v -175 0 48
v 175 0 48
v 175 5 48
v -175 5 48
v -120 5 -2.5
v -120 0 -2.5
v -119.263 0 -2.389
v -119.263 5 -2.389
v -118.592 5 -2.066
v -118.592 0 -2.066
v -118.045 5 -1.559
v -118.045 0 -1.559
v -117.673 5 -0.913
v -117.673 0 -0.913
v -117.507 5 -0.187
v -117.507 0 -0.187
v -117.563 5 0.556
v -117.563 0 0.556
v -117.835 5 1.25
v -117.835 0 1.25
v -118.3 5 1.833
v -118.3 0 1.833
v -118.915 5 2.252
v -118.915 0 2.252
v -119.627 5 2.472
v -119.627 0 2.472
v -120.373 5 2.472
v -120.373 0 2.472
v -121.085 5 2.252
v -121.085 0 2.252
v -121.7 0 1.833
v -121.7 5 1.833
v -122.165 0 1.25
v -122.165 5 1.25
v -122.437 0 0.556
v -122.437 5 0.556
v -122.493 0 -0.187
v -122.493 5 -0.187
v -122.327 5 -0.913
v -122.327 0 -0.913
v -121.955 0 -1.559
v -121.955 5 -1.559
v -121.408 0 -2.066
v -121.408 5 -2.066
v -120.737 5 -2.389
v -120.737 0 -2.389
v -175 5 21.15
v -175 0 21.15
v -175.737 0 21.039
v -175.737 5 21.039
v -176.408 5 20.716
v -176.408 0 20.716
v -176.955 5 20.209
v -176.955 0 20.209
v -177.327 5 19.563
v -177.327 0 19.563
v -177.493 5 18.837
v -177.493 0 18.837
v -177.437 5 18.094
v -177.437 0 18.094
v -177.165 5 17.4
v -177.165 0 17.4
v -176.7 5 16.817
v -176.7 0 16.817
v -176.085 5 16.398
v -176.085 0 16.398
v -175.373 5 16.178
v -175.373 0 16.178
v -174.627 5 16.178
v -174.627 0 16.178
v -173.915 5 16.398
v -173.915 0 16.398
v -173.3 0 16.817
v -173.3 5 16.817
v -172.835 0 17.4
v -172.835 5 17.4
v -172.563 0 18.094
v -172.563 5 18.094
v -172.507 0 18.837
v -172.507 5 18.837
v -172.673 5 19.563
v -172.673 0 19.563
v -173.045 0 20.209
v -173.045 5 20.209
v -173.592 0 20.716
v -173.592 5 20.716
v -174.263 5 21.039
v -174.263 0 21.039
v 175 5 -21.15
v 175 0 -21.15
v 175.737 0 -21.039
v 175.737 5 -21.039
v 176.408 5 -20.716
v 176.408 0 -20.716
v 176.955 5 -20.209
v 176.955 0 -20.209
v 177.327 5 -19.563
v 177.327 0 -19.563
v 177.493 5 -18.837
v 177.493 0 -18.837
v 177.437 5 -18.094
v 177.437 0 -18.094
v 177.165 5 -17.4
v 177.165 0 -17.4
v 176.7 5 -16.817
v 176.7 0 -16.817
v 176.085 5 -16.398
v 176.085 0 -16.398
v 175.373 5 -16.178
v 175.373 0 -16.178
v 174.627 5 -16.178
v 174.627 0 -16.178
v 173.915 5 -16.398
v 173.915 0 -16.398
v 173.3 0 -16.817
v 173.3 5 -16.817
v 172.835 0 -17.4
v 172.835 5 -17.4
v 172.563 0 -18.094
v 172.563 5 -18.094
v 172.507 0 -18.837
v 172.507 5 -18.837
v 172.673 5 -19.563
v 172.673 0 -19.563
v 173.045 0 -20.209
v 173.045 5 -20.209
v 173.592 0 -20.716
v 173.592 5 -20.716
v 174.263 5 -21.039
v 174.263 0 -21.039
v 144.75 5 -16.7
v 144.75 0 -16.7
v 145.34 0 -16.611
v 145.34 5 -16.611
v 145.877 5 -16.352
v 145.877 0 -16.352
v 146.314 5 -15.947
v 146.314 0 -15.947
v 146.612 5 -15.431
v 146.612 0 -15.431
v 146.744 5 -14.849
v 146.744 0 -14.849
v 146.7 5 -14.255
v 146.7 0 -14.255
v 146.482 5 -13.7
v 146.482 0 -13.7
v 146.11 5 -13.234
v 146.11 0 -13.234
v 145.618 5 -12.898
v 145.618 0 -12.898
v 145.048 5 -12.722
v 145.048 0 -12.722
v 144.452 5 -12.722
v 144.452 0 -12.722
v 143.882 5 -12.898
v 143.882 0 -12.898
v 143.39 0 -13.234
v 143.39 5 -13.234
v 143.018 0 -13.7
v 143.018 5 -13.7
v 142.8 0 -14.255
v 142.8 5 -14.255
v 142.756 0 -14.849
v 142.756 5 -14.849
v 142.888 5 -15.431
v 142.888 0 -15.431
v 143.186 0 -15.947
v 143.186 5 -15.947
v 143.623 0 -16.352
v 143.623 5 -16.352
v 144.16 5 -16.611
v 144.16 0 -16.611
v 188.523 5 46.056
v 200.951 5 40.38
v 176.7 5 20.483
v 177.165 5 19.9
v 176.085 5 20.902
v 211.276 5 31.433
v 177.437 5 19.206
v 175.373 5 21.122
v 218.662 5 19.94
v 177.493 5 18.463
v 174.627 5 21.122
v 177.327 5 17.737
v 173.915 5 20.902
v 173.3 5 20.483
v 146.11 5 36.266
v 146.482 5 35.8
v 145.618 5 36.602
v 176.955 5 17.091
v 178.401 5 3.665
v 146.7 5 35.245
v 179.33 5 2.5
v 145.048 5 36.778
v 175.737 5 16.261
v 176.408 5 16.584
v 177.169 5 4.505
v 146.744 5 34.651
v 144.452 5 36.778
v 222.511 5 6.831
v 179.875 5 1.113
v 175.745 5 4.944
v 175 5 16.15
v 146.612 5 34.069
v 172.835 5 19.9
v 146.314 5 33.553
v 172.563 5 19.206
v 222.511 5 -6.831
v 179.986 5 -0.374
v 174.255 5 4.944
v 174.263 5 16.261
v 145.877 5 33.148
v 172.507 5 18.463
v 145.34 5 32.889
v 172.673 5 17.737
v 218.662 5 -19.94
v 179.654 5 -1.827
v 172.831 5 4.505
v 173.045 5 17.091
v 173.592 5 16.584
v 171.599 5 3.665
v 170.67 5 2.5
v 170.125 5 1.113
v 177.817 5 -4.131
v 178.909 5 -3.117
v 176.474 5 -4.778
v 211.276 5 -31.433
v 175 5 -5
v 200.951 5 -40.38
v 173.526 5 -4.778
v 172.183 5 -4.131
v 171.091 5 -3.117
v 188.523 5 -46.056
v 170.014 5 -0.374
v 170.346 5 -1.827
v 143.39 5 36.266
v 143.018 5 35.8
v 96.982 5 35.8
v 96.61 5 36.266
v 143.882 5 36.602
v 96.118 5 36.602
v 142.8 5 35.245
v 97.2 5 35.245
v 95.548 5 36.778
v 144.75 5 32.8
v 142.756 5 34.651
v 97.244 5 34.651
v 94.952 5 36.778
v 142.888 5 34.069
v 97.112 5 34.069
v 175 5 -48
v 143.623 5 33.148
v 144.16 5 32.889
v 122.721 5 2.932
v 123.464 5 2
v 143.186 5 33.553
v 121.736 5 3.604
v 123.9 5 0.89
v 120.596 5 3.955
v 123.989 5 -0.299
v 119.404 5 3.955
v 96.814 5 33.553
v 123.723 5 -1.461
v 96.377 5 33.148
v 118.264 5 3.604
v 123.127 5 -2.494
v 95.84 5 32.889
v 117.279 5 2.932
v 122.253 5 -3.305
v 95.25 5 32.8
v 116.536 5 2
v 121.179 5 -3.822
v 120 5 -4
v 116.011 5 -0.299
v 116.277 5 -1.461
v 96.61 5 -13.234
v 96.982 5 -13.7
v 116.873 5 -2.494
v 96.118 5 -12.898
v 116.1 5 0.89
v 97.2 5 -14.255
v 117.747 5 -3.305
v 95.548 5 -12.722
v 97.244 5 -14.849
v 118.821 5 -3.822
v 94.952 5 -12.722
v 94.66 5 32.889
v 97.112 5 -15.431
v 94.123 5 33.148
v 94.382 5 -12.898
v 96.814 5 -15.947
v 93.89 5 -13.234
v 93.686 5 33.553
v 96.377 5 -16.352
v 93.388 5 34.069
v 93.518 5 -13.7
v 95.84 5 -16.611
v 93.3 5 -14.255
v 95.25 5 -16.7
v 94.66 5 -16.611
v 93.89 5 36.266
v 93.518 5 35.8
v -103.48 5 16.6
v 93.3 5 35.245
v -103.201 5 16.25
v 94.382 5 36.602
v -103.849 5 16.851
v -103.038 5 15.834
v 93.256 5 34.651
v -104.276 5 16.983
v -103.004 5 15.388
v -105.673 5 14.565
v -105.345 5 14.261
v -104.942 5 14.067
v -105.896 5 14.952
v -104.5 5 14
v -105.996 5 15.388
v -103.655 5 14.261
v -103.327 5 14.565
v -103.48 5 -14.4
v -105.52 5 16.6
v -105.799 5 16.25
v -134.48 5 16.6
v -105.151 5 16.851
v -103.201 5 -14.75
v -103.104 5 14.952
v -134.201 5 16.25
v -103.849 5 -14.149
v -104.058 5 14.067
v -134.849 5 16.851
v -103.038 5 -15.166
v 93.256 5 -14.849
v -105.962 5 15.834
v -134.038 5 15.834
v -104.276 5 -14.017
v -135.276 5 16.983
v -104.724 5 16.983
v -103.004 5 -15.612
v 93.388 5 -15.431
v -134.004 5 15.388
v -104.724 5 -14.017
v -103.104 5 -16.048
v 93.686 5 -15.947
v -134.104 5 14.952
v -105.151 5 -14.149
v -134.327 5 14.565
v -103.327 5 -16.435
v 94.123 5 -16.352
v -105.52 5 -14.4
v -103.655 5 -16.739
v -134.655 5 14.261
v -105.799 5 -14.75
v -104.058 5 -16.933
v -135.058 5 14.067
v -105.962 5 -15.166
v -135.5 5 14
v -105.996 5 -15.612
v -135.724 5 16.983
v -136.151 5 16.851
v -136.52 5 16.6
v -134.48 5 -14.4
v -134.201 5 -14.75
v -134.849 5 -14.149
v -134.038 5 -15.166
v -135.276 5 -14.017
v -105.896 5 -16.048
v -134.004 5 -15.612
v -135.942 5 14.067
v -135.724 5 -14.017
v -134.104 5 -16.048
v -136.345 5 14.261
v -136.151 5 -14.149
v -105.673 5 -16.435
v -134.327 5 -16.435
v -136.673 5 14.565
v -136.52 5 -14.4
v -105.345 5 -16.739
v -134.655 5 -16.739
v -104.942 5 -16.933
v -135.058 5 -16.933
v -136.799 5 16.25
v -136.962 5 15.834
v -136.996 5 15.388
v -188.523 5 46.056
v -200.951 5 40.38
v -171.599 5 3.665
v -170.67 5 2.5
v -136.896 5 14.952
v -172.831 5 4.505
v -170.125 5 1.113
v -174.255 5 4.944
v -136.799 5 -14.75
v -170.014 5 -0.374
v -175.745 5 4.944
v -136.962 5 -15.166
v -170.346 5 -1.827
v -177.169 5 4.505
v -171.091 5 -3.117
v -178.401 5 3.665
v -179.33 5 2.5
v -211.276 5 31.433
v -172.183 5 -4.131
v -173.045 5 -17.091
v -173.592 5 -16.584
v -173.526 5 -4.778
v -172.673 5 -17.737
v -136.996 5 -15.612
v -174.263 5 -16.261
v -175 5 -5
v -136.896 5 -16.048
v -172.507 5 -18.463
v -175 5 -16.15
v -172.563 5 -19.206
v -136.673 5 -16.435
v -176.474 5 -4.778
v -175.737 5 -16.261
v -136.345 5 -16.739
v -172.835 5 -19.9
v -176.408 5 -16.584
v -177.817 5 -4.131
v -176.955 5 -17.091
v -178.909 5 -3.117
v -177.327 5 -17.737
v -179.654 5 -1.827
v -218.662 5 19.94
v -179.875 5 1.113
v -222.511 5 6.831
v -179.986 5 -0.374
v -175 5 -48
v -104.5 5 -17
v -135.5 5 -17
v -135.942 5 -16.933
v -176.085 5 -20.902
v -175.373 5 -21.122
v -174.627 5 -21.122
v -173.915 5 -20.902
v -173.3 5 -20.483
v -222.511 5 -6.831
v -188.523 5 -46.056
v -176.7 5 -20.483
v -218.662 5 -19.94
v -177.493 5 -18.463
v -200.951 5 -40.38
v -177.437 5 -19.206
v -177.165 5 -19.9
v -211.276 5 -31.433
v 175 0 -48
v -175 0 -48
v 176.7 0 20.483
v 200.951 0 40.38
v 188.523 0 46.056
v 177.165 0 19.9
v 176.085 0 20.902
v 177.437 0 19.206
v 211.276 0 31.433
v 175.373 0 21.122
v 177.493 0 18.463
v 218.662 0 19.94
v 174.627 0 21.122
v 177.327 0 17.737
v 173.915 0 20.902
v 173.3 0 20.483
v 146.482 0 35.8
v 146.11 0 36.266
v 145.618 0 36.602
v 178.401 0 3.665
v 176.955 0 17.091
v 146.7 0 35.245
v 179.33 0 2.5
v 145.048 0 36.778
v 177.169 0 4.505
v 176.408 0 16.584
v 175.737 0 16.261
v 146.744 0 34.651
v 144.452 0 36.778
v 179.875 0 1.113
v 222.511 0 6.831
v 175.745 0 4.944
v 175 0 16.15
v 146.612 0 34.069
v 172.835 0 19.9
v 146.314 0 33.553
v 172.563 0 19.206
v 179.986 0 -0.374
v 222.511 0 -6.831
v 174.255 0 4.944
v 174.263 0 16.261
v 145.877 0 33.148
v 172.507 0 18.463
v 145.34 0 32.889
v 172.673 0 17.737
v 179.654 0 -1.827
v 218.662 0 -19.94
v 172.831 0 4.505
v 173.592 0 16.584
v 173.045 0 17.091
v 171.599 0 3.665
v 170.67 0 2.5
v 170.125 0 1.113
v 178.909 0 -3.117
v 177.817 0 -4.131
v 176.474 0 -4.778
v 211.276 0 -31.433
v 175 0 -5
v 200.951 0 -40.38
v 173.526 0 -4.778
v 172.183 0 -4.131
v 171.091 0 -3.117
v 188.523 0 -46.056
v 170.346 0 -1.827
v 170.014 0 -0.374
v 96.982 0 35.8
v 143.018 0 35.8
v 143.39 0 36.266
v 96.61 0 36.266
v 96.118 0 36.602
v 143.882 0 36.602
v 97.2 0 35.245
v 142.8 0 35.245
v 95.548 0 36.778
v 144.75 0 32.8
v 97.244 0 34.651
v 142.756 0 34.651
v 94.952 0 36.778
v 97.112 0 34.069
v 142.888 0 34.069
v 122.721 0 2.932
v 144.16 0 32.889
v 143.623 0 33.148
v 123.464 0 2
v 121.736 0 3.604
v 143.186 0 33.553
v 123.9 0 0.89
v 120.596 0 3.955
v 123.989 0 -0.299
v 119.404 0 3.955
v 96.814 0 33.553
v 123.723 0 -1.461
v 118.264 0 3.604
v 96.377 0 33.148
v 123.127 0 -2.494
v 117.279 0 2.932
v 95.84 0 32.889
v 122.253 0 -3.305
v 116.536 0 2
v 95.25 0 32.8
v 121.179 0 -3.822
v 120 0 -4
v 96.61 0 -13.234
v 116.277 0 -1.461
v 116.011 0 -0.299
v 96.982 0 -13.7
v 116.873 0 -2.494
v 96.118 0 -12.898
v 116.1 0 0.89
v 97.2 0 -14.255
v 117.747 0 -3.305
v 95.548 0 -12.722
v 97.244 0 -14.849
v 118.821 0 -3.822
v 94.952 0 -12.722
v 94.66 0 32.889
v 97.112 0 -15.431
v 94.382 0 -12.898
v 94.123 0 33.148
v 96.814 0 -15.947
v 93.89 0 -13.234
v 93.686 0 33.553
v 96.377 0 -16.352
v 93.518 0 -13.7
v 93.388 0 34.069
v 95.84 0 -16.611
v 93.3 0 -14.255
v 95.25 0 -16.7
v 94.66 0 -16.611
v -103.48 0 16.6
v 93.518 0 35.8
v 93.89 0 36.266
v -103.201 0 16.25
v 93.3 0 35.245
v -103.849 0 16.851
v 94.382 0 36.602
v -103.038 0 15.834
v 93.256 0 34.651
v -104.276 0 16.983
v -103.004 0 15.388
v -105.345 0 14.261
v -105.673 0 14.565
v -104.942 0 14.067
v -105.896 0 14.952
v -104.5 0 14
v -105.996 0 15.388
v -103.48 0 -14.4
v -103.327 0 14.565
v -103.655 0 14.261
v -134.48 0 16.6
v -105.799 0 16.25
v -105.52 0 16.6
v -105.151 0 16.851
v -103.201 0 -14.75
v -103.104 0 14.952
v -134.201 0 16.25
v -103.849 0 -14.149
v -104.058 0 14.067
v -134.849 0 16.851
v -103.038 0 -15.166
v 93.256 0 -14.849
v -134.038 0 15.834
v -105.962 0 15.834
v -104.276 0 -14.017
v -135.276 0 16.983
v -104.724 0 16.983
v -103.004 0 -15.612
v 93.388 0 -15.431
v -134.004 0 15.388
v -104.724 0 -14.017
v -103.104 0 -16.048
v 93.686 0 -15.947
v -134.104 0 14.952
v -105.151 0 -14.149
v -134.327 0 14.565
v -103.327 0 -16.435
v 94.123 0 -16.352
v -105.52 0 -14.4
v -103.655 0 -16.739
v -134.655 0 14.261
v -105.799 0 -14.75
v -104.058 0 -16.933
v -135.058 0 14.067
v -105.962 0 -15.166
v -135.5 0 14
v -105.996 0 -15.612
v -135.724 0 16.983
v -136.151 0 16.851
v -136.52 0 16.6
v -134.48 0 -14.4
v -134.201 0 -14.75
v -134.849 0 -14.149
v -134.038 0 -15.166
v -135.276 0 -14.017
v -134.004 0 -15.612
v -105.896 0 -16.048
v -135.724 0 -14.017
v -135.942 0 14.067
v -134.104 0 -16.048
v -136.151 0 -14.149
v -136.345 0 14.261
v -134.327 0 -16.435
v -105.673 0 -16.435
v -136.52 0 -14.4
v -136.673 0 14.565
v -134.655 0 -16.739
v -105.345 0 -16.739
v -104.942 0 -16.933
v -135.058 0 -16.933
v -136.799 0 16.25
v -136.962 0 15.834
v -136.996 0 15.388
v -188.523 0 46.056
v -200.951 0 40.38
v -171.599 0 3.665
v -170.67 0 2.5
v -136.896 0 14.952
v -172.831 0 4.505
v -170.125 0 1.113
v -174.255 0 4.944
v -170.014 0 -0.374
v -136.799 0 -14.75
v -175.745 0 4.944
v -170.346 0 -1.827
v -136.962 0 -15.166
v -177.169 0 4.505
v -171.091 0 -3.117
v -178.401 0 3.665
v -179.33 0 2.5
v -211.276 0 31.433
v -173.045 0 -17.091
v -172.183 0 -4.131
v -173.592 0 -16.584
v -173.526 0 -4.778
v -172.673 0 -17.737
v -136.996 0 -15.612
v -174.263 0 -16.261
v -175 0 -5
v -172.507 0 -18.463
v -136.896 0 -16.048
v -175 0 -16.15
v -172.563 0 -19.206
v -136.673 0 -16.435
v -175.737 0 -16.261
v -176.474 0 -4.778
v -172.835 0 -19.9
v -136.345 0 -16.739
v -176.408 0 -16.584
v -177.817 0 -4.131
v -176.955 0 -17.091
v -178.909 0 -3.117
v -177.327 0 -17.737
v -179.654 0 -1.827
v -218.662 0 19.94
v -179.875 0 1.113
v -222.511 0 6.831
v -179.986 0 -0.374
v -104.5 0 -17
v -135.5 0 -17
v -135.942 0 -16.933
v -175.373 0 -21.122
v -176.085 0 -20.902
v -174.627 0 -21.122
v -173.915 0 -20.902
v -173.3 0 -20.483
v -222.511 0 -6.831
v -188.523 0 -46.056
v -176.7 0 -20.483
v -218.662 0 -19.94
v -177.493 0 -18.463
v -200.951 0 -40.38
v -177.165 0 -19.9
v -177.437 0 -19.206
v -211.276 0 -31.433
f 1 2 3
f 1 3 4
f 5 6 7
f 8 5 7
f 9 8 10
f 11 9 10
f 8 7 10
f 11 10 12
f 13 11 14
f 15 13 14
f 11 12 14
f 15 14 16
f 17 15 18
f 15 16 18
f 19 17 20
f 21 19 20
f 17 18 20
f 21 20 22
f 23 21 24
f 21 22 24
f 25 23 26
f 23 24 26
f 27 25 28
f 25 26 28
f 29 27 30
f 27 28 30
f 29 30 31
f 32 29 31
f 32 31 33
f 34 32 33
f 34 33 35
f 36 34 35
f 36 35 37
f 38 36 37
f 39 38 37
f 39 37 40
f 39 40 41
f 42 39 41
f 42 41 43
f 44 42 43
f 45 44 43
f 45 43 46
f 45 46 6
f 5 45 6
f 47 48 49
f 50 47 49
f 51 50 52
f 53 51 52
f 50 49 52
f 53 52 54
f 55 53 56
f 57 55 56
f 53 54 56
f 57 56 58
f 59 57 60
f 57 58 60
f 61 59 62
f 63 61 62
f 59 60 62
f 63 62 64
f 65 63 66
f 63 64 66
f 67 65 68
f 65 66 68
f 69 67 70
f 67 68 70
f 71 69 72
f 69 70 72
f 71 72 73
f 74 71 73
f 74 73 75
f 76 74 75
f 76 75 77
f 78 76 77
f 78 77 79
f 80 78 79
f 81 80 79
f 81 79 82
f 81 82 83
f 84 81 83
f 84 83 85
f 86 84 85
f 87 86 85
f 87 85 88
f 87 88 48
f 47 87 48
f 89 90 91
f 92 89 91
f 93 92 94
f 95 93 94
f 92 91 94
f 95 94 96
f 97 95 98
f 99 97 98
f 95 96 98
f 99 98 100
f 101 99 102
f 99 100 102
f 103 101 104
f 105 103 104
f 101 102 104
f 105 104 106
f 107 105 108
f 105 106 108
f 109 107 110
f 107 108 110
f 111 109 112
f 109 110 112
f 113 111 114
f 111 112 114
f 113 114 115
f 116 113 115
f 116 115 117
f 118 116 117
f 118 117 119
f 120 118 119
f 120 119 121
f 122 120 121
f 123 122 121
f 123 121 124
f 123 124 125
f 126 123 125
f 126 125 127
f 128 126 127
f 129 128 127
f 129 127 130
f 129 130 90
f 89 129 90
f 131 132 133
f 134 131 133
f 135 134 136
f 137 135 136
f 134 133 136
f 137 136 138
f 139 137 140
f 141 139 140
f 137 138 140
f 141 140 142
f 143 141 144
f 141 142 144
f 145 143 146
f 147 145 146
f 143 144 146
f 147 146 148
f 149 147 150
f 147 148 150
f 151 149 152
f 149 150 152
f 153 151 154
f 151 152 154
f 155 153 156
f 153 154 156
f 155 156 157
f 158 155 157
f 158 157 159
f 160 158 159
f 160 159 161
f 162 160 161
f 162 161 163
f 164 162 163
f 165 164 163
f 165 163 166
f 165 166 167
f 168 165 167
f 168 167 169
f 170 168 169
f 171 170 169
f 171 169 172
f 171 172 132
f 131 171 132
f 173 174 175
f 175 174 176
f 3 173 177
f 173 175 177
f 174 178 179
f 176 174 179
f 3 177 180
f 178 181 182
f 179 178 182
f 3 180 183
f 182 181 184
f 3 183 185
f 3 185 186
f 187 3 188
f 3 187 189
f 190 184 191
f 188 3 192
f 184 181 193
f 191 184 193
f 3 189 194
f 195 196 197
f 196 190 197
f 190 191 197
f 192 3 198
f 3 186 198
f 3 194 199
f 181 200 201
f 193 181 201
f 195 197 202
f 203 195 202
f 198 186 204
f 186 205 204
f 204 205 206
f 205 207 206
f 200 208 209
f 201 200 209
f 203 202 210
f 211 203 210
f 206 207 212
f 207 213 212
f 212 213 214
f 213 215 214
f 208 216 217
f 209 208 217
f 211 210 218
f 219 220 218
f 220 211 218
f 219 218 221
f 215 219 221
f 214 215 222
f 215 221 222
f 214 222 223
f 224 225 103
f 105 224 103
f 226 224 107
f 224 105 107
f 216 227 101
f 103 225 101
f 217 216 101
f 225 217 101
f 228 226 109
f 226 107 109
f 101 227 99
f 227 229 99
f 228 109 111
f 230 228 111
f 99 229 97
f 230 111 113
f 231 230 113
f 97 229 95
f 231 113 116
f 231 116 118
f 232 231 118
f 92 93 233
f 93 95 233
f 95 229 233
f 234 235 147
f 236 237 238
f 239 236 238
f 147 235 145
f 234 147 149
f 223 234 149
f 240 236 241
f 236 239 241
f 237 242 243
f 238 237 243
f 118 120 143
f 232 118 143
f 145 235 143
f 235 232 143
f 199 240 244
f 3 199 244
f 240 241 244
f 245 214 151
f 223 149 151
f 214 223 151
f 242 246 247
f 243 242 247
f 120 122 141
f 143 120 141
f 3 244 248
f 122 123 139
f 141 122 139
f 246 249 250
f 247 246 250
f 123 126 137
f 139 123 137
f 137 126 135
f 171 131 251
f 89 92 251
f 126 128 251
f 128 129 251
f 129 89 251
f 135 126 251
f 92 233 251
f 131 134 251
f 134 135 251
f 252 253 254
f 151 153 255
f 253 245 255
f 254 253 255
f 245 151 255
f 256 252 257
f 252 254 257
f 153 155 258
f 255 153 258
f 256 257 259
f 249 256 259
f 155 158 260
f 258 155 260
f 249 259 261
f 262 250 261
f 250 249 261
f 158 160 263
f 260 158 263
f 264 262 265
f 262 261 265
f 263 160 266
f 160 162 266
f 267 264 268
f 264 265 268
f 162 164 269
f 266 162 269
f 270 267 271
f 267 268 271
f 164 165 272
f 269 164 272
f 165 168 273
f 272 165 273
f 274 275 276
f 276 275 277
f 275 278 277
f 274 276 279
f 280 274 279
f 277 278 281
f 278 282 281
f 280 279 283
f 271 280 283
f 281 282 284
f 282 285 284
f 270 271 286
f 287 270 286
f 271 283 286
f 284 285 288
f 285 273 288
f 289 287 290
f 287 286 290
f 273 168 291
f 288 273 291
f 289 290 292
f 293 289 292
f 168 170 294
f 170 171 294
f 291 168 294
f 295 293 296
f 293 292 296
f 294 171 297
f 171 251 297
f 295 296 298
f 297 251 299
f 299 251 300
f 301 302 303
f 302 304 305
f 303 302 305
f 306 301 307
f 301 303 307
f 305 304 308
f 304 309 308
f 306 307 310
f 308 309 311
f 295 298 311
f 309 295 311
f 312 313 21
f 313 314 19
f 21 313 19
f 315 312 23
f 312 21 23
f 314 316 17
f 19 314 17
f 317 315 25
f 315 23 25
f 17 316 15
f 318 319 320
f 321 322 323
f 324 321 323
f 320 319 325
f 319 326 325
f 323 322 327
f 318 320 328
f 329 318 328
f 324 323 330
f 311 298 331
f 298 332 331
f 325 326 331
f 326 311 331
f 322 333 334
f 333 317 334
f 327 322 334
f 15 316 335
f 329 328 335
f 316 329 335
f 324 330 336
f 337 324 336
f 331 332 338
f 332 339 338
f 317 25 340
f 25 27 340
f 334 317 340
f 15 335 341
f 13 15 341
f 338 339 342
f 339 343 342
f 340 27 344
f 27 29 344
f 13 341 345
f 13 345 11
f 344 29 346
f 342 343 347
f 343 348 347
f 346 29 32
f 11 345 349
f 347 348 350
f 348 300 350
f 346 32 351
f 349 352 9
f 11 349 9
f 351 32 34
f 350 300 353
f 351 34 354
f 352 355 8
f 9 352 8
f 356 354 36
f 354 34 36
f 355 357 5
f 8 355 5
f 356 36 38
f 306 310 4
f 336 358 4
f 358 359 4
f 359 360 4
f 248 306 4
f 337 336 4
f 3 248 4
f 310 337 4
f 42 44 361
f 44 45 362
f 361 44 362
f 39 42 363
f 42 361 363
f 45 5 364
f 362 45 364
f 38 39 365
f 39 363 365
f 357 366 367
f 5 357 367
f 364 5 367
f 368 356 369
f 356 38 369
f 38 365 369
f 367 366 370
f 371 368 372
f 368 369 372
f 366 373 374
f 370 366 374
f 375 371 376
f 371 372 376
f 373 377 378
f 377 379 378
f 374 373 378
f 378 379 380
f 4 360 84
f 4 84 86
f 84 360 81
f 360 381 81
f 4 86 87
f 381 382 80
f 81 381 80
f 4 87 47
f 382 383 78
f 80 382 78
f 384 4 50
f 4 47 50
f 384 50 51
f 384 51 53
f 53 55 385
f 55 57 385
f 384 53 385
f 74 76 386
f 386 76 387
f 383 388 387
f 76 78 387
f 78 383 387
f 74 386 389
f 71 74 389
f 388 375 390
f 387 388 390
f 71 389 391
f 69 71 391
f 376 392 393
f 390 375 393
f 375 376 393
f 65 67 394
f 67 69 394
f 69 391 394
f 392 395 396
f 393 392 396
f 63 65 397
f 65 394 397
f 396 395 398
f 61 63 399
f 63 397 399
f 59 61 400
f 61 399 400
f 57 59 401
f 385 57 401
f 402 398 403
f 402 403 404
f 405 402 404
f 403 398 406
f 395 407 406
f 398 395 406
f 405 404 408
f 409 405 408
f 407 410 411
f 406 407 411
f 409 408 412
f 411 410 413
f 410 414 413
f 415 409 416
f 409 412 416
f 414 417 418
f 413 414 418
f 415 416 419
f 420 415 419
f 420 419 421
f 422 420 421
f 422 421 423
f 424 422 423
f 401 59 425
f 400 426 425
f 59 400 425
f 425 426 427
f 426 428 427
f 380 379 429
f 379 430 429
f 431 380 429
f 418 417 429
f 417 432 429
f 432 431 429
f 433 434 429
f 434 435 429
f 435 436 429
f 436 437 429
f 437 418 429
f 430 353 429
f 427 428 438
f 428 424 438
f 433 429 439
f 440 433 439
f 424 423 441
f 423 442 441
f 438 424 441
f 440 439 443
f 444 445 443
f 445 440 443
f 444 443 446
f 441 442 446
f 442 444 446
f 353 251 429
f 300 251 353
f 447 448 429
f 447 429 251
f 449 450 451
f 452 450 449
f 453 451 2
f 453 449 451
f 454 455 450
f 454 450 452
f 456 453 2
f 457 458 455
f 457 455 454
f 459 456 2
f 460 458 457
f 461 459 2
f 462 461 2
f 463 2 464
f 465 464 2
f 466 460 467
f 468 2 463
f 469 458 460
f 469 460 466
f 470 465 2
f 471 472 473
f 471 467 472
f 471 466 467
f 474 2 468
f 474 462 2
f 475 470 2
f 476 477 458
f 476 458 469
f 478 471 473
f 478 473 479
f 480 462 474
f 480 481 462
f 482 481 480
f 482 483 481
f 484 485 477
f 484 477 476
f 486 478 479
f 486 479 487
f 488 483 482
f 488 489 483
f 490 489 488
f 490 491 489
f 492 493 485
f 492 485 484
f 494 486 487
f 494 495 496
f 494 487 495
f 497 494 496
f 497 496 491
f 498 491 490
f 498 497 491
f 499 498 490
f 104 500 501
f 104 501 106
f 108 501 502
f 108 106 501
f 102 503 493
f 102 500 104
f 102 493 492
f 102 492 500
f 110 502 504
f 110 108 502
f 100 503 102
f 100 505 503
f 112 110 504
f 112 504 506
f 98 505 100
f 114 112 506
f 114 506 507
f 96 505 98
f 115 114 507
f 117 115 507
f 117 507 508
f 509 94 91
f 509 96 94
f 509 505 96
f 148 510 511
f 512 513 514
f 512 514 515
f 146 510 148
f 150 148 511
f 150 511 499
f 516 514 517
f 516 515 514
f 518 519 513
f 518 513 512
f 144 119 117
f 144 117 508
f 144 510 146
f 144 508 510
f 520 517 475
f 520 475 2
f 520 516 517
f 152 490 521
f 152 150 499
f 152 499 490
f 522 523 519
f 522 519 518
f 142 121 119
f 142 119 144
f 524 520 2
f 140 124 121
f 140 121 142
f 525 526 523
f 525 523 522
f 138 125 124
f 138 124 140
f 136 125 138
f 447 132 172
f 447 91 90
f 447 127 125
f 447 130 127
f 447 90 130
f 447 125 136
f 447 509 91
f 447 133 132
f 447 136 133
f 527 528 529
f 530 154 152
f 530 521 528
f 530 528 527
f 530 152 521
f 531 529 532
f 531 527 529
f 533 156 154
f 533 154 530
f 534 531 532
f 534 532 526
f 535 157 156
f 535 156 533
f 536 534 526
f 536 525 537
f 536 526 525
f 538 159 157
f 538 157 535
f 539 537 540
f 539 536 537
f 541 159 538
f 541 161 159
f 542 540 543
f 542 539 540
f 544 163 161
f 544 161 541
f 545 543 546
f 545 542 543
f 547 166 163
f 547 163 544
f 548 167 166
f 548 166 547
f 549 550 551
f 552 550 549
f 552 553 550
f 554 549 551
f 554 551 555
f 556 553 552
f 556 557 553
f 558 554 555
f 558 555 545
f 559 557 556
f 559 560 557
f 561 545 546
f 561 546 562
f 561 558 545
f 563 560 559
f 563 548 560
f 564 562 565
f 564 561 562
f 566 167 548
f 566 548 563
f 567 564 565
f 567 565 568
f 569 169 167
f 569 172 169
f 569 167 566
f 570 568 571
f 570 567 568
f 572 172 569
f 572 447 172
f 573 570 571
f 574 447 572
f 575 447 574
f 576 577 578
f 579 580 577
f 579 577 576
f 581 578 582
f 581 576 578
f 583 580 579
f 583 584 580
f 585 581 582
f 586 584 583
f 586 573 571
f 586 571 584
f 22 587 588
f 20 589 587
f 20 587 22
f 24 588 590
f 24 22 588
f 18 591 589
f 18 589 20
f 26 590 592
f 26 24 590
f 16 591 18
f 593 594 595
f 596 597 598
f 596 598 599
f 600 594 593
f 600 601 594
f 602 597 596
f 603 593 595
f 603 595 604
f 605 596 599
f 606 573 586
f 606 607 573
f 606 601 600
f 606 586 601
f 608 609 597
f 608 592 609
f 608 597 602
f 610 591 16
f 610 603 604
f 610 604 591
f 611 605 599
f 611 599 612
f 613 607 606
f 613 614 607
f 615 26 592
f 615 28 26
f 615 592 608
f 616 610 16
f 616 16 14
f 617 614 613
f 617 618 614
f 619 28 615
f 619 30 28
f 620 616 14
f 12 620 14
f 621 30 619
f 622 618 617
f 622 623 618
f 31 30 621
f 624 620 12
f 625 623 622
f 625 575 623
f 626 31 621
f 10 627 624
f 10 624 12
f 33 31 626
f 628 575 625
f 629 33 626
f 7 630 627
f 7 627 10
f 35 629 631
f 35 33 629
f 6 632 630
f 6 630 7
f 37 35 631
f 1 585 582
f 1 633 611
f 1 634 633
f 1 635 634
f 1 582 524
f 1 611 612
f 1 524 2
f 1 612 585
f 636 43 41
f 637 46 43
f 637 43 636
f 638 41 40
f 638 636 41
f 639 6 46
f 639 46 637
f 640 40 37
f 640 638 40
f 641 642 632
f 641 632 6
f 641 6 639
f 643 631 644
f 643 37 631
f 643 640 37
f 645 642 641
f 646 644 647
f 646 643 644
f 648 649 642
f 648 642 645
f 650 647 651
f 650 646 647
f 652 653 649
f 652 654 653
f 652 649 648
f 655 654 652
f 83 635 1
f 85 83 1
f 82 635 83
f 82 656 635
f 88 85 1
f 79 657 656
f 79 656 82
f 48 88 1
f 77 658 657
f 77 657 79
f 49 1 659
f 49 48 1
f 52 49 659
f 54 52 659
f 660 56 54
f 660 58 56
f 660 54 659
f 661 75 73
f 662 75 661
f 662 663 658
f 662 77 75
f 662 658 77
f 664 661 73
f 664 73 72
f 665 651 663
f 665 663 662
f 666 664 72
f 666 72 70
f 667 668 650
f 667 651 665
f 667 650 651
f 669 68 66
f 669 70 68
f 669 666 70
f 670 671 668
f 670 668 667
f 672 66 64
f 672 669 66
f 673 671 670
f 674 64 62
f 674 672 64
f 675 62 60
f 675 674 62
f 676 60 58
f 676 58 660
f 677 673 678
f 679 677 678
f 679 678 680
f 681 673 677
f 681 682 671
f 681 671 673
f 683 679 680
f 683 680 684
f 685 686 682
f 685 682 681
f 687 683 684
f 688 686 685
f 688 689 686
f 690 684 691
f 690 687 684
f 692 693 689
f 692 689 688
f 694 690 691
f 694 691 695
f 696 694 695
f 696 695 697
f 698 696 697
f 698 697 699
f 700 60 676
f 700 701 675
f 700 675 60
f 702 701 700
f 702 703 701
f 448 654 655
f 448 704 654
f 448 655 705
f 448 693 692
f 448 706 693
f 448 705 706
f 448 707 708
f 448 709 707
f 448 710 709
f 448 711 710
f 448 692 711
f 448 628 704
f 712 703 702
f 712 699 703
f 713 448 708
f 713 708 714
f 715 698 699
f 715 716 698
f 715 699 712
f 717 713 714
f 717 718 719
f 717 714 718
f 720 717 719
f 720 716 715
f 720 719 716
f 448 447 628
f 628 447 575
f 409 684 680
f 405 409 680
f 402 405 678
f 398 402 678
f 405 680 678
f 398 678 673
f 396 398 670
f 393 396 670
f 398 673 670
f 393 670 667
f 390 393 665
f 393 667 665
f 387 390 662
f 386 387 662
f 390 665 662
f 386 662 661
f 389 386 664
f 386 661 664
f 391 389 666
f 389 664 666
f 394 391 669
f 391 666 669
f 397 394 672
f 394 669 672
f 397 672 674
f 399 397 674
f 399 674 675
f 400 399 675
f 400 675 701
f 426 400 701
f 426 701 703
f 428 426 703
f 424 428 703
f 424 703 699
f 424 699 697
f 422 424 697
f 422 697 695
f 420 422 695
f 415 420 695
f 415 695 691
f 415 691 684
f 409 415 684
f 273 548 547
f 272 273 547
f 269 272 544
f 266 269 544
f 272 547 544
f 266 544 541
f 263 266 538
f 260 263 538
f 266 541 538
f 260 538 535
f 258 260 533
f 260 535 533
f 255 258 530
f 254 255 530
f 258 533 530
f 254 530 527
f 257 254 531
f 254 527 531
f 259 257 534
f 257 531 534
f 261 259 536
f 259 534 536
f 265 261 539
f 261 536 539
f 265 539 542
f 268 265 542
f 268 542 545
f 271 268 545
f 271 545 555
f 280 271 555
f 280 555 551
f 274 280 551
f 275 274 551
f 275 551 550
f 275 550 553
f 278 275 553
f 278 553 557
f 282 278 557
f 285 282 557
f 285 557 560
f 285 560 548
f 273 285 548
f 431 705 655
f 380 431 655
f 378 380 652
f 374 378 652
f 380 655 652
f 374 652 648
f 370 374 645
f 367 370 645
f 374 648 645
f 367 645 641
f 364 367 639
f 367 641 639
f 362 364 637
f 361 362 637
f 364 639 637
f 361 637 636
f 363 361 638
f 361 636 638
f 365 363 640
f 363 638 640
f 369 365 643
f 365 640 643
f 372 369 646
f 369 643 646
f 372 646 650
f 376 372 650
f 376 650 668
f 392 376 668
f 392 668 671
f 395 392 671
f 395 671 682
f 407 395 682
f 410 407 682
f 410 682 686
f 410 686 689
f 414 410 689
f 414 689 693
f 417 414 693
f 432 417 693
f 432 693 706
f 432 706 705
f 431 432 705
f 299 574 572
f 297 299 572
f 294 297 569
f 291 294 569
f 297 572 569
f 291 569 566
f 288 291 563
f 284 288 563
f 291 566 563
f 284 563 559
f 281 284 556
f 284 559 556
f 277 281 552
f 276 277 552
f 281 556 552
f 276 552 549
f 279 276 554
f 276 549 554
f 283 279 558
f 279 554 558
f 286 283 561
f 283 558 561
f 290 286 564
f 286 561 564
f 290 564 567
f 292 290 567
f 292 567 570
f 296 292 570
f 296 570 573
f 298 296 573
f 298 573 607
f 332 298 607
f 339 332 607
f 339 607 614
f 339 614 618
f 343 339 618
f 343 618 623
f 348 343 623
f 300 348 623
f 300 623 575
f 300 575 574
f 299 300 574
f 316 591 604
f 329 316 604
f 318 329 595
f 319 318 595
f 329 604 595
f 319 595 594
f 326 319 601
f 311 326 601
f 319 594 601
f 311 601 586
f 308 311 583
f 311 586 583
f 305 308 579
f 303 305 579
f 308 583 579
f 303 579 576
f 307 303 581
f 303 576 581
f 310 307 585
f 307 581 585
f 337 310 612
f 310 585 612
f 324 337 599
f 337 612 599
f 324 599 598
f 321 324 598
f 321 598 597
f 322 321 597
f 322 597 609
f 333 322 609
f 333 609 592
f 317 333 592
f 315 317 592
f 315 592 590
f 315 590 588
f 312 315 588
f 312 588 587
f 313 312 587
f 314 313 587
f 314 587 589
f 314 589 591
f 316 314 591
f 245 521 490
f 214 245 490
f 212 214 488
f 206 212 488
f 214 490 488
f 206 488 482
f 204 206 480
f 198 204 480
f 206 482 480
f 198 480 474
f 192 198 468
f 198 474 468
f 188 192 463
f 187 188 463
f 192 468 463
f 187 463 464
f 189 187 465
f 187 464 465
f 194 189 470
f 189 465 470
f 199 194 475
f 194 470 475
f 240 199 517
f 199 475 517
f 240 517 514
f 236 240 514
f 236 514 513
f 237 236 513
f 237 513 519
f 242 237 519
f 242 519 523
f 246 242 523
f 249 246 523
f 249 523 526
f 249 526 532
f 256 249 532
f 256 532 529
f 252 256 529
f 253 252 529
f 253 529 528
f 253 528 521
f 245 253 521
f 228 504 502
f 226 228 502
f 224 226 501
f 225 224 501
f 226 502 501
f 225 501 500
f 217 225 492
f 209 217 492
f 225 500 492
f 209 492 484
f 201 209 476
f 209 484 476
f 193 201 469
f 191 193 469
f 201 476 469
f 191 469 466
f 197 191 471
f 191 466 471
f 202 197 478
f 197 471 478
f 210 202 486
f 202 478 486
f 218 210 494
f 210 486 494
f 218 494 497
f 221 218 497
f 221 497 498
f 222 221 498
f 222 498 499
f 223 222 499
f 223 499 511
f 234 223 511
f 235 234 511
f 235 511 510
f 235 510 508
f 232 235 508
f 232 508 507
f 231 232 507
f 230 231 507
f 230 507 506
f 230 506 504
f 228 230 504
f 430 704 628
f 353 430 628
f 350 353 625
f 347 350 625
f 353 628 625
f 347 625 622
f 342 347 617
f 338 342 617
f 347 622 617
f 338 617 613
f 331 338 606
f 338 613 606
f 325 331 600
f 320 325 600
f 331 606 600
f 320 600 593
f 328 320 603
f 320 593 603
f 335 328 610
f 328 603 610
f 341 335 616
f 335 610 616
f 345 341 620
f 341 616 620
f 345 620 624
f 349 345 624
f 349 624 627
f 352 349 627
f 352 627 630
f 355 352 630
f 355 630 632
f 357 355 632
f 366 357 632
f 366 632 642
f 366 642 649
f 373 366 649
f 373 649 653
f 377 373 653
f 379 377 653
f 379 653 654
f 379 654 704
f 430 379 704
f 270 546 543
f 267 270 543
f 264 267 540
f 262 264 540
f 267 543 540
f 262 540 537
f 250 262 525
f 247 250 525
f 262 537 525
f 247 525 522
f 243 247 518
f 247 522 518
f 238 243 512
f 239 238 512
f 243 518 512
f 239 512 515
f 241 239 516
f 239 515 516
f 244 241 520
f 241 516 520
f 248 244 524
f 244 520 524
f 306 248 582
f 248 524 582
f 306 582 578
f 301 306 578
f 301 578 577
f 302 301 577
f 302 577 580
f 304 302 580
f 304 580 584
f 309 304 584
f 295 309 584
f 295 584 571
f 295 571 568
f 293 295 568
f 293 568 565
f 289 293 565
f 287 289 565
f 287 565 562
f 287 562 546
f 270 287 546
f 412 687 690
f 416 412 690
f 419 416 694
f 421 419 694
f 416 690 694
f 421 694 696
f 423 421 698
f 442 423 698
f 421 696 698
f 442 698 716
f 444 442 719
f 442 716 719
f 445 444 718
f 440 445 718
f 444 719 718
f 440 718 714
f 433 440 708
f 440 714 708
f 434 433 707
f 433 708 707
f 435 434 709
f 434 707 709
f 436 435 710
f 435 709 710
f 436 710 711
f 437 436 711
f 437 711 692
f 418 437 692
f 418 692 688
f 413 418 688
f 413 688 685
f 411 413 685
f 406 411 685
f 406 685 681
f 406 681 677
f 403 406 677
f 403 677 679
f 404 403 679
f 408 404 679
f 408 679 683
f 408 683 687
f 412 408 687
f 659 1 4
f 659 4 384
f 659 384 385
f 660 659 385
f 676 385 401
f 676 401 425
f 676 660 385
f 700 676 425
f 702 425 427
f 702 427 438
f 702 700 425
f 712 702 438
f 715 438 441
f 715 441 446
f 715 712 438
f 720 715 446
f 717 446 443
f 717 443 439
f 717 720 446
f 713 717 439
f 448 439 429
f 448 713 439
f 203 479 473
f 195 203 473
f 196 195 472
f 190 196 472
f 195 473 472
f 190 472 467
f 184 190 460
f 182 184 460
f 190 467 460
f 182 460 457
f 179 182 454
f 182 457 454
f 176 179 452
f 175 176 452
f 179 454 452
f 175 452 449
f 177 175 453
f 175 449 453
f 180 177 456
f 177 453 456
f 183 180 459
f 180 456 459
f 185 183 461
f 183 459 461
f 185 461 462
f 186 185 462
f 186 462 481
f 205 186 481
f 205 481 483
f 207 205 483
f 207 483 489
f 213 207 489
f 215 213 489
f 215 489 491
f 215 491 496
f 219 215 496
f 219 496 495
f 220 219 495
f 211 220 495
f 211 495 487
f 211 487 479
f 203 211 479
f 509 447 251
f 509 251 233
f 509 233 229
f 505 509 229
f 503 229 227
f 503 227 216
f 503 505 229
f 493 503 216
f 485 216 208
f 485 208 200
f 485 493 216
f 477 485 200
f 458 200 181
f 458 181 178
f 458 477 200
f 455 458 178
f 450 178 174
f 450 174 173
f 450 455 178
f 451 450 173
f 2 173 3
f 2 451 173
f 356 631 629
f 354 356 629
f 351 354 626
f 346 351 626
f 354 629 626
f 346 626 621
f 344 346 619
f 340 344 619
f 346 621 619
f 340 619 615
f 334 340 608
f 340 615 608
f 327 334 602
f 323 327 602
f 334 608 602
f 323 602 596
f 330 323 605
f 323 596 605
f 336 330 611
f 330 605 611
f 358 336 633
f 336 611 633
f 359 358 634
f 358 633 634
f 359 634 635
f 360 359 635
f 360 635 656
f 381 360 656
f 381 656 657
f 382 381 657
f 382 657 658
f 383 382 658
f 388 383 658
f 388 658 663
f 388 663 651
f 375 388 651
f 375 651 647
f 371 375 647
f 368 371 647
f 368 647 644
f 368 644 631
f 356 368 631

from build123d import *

# Parameters (mm, degrees)
BOSS_EXTRUDE1_DEPTH = 5
SKETCH2_R           = 5
SKETCH2_R_2         = 2.5
SKETCH2_R_3         = 4
SKETCH2_R_4         = 2
SKETCH2_R_5         = 1.5
CUT_EXTRUDE1_DEPTH  = 10


with BuildPart() as part:
    # Sketch1 → Boss-Extrude1 (new body)
    with BuildSketch(Plane(origin=(0, 0, 0), x_dir=(1, 0, 0), z_dir=(0, 1, 0))):
        with BuildLine():
            Line((-175, 48), (175, 48))
            ThreePointArc((175, 48), (223, 0), (175, -48))
            Line((175, -48), (-175, -48))
            ThreePointArc((-175, -48), (-223, 0), (-175, 48))
        make_face()
    extrude(amount=BOSS_EXTRUDE1_DEPTH)

    # Sketch2 → Cut-Extrude1 (cut)
    with BuildSketch(Plane.XZ):
        with Locations((175, 0)):
            Circle(SKETCH2_R)
        with Locations((175, 18.65)):
            Circle(SKETCH2_R_2)
        with Locations((175, -18.65)):
            Circle(SKETCH2_R_2)
        with Locations((-175, -18.65)):
            Circle(SKETCH2_R_2)
        with Locations((-175, 18.65)):
            Circle(SKETCH2_R_2)
        with Locations((-175, 0)):
            Circle(SKETCH2_R)
        with Locations((120, 0)):
            Circle(SKETCH2_R_3)
        with Locations((95.25, -14.7)):
            Circle(SKETCH2_R_4)
        with Locations((144.75, -14.7)):
            Circle(SKETCH2_R_4)
        with Locations((144.75, 34.8)):
            Circle(SKETCH2_R_4)
        with Locations((95.25, 34.8)):
            Circle(SKETCH2_R_4)
        with Locations((-135.5, -15.5)):
            Circle(SKETCH2_R_5)
        with Locations((-135.5, 15.5)):
            Circle(SKETCH2_R_5)
        with Locations((-104.5, 15.5)):
            Circle(SKETCH2_R_5)
        with Locations((-104.5, -15.5)):
            Circle(SKETCH2_R_5)
        with Locations((-120, 0)):
            Circle(SKETCH2_R_2)
    extrude(amount=-CUT_EXTRUDE1_DEPTH, mode=Mode.SUBTRACT)


solid = part.part
